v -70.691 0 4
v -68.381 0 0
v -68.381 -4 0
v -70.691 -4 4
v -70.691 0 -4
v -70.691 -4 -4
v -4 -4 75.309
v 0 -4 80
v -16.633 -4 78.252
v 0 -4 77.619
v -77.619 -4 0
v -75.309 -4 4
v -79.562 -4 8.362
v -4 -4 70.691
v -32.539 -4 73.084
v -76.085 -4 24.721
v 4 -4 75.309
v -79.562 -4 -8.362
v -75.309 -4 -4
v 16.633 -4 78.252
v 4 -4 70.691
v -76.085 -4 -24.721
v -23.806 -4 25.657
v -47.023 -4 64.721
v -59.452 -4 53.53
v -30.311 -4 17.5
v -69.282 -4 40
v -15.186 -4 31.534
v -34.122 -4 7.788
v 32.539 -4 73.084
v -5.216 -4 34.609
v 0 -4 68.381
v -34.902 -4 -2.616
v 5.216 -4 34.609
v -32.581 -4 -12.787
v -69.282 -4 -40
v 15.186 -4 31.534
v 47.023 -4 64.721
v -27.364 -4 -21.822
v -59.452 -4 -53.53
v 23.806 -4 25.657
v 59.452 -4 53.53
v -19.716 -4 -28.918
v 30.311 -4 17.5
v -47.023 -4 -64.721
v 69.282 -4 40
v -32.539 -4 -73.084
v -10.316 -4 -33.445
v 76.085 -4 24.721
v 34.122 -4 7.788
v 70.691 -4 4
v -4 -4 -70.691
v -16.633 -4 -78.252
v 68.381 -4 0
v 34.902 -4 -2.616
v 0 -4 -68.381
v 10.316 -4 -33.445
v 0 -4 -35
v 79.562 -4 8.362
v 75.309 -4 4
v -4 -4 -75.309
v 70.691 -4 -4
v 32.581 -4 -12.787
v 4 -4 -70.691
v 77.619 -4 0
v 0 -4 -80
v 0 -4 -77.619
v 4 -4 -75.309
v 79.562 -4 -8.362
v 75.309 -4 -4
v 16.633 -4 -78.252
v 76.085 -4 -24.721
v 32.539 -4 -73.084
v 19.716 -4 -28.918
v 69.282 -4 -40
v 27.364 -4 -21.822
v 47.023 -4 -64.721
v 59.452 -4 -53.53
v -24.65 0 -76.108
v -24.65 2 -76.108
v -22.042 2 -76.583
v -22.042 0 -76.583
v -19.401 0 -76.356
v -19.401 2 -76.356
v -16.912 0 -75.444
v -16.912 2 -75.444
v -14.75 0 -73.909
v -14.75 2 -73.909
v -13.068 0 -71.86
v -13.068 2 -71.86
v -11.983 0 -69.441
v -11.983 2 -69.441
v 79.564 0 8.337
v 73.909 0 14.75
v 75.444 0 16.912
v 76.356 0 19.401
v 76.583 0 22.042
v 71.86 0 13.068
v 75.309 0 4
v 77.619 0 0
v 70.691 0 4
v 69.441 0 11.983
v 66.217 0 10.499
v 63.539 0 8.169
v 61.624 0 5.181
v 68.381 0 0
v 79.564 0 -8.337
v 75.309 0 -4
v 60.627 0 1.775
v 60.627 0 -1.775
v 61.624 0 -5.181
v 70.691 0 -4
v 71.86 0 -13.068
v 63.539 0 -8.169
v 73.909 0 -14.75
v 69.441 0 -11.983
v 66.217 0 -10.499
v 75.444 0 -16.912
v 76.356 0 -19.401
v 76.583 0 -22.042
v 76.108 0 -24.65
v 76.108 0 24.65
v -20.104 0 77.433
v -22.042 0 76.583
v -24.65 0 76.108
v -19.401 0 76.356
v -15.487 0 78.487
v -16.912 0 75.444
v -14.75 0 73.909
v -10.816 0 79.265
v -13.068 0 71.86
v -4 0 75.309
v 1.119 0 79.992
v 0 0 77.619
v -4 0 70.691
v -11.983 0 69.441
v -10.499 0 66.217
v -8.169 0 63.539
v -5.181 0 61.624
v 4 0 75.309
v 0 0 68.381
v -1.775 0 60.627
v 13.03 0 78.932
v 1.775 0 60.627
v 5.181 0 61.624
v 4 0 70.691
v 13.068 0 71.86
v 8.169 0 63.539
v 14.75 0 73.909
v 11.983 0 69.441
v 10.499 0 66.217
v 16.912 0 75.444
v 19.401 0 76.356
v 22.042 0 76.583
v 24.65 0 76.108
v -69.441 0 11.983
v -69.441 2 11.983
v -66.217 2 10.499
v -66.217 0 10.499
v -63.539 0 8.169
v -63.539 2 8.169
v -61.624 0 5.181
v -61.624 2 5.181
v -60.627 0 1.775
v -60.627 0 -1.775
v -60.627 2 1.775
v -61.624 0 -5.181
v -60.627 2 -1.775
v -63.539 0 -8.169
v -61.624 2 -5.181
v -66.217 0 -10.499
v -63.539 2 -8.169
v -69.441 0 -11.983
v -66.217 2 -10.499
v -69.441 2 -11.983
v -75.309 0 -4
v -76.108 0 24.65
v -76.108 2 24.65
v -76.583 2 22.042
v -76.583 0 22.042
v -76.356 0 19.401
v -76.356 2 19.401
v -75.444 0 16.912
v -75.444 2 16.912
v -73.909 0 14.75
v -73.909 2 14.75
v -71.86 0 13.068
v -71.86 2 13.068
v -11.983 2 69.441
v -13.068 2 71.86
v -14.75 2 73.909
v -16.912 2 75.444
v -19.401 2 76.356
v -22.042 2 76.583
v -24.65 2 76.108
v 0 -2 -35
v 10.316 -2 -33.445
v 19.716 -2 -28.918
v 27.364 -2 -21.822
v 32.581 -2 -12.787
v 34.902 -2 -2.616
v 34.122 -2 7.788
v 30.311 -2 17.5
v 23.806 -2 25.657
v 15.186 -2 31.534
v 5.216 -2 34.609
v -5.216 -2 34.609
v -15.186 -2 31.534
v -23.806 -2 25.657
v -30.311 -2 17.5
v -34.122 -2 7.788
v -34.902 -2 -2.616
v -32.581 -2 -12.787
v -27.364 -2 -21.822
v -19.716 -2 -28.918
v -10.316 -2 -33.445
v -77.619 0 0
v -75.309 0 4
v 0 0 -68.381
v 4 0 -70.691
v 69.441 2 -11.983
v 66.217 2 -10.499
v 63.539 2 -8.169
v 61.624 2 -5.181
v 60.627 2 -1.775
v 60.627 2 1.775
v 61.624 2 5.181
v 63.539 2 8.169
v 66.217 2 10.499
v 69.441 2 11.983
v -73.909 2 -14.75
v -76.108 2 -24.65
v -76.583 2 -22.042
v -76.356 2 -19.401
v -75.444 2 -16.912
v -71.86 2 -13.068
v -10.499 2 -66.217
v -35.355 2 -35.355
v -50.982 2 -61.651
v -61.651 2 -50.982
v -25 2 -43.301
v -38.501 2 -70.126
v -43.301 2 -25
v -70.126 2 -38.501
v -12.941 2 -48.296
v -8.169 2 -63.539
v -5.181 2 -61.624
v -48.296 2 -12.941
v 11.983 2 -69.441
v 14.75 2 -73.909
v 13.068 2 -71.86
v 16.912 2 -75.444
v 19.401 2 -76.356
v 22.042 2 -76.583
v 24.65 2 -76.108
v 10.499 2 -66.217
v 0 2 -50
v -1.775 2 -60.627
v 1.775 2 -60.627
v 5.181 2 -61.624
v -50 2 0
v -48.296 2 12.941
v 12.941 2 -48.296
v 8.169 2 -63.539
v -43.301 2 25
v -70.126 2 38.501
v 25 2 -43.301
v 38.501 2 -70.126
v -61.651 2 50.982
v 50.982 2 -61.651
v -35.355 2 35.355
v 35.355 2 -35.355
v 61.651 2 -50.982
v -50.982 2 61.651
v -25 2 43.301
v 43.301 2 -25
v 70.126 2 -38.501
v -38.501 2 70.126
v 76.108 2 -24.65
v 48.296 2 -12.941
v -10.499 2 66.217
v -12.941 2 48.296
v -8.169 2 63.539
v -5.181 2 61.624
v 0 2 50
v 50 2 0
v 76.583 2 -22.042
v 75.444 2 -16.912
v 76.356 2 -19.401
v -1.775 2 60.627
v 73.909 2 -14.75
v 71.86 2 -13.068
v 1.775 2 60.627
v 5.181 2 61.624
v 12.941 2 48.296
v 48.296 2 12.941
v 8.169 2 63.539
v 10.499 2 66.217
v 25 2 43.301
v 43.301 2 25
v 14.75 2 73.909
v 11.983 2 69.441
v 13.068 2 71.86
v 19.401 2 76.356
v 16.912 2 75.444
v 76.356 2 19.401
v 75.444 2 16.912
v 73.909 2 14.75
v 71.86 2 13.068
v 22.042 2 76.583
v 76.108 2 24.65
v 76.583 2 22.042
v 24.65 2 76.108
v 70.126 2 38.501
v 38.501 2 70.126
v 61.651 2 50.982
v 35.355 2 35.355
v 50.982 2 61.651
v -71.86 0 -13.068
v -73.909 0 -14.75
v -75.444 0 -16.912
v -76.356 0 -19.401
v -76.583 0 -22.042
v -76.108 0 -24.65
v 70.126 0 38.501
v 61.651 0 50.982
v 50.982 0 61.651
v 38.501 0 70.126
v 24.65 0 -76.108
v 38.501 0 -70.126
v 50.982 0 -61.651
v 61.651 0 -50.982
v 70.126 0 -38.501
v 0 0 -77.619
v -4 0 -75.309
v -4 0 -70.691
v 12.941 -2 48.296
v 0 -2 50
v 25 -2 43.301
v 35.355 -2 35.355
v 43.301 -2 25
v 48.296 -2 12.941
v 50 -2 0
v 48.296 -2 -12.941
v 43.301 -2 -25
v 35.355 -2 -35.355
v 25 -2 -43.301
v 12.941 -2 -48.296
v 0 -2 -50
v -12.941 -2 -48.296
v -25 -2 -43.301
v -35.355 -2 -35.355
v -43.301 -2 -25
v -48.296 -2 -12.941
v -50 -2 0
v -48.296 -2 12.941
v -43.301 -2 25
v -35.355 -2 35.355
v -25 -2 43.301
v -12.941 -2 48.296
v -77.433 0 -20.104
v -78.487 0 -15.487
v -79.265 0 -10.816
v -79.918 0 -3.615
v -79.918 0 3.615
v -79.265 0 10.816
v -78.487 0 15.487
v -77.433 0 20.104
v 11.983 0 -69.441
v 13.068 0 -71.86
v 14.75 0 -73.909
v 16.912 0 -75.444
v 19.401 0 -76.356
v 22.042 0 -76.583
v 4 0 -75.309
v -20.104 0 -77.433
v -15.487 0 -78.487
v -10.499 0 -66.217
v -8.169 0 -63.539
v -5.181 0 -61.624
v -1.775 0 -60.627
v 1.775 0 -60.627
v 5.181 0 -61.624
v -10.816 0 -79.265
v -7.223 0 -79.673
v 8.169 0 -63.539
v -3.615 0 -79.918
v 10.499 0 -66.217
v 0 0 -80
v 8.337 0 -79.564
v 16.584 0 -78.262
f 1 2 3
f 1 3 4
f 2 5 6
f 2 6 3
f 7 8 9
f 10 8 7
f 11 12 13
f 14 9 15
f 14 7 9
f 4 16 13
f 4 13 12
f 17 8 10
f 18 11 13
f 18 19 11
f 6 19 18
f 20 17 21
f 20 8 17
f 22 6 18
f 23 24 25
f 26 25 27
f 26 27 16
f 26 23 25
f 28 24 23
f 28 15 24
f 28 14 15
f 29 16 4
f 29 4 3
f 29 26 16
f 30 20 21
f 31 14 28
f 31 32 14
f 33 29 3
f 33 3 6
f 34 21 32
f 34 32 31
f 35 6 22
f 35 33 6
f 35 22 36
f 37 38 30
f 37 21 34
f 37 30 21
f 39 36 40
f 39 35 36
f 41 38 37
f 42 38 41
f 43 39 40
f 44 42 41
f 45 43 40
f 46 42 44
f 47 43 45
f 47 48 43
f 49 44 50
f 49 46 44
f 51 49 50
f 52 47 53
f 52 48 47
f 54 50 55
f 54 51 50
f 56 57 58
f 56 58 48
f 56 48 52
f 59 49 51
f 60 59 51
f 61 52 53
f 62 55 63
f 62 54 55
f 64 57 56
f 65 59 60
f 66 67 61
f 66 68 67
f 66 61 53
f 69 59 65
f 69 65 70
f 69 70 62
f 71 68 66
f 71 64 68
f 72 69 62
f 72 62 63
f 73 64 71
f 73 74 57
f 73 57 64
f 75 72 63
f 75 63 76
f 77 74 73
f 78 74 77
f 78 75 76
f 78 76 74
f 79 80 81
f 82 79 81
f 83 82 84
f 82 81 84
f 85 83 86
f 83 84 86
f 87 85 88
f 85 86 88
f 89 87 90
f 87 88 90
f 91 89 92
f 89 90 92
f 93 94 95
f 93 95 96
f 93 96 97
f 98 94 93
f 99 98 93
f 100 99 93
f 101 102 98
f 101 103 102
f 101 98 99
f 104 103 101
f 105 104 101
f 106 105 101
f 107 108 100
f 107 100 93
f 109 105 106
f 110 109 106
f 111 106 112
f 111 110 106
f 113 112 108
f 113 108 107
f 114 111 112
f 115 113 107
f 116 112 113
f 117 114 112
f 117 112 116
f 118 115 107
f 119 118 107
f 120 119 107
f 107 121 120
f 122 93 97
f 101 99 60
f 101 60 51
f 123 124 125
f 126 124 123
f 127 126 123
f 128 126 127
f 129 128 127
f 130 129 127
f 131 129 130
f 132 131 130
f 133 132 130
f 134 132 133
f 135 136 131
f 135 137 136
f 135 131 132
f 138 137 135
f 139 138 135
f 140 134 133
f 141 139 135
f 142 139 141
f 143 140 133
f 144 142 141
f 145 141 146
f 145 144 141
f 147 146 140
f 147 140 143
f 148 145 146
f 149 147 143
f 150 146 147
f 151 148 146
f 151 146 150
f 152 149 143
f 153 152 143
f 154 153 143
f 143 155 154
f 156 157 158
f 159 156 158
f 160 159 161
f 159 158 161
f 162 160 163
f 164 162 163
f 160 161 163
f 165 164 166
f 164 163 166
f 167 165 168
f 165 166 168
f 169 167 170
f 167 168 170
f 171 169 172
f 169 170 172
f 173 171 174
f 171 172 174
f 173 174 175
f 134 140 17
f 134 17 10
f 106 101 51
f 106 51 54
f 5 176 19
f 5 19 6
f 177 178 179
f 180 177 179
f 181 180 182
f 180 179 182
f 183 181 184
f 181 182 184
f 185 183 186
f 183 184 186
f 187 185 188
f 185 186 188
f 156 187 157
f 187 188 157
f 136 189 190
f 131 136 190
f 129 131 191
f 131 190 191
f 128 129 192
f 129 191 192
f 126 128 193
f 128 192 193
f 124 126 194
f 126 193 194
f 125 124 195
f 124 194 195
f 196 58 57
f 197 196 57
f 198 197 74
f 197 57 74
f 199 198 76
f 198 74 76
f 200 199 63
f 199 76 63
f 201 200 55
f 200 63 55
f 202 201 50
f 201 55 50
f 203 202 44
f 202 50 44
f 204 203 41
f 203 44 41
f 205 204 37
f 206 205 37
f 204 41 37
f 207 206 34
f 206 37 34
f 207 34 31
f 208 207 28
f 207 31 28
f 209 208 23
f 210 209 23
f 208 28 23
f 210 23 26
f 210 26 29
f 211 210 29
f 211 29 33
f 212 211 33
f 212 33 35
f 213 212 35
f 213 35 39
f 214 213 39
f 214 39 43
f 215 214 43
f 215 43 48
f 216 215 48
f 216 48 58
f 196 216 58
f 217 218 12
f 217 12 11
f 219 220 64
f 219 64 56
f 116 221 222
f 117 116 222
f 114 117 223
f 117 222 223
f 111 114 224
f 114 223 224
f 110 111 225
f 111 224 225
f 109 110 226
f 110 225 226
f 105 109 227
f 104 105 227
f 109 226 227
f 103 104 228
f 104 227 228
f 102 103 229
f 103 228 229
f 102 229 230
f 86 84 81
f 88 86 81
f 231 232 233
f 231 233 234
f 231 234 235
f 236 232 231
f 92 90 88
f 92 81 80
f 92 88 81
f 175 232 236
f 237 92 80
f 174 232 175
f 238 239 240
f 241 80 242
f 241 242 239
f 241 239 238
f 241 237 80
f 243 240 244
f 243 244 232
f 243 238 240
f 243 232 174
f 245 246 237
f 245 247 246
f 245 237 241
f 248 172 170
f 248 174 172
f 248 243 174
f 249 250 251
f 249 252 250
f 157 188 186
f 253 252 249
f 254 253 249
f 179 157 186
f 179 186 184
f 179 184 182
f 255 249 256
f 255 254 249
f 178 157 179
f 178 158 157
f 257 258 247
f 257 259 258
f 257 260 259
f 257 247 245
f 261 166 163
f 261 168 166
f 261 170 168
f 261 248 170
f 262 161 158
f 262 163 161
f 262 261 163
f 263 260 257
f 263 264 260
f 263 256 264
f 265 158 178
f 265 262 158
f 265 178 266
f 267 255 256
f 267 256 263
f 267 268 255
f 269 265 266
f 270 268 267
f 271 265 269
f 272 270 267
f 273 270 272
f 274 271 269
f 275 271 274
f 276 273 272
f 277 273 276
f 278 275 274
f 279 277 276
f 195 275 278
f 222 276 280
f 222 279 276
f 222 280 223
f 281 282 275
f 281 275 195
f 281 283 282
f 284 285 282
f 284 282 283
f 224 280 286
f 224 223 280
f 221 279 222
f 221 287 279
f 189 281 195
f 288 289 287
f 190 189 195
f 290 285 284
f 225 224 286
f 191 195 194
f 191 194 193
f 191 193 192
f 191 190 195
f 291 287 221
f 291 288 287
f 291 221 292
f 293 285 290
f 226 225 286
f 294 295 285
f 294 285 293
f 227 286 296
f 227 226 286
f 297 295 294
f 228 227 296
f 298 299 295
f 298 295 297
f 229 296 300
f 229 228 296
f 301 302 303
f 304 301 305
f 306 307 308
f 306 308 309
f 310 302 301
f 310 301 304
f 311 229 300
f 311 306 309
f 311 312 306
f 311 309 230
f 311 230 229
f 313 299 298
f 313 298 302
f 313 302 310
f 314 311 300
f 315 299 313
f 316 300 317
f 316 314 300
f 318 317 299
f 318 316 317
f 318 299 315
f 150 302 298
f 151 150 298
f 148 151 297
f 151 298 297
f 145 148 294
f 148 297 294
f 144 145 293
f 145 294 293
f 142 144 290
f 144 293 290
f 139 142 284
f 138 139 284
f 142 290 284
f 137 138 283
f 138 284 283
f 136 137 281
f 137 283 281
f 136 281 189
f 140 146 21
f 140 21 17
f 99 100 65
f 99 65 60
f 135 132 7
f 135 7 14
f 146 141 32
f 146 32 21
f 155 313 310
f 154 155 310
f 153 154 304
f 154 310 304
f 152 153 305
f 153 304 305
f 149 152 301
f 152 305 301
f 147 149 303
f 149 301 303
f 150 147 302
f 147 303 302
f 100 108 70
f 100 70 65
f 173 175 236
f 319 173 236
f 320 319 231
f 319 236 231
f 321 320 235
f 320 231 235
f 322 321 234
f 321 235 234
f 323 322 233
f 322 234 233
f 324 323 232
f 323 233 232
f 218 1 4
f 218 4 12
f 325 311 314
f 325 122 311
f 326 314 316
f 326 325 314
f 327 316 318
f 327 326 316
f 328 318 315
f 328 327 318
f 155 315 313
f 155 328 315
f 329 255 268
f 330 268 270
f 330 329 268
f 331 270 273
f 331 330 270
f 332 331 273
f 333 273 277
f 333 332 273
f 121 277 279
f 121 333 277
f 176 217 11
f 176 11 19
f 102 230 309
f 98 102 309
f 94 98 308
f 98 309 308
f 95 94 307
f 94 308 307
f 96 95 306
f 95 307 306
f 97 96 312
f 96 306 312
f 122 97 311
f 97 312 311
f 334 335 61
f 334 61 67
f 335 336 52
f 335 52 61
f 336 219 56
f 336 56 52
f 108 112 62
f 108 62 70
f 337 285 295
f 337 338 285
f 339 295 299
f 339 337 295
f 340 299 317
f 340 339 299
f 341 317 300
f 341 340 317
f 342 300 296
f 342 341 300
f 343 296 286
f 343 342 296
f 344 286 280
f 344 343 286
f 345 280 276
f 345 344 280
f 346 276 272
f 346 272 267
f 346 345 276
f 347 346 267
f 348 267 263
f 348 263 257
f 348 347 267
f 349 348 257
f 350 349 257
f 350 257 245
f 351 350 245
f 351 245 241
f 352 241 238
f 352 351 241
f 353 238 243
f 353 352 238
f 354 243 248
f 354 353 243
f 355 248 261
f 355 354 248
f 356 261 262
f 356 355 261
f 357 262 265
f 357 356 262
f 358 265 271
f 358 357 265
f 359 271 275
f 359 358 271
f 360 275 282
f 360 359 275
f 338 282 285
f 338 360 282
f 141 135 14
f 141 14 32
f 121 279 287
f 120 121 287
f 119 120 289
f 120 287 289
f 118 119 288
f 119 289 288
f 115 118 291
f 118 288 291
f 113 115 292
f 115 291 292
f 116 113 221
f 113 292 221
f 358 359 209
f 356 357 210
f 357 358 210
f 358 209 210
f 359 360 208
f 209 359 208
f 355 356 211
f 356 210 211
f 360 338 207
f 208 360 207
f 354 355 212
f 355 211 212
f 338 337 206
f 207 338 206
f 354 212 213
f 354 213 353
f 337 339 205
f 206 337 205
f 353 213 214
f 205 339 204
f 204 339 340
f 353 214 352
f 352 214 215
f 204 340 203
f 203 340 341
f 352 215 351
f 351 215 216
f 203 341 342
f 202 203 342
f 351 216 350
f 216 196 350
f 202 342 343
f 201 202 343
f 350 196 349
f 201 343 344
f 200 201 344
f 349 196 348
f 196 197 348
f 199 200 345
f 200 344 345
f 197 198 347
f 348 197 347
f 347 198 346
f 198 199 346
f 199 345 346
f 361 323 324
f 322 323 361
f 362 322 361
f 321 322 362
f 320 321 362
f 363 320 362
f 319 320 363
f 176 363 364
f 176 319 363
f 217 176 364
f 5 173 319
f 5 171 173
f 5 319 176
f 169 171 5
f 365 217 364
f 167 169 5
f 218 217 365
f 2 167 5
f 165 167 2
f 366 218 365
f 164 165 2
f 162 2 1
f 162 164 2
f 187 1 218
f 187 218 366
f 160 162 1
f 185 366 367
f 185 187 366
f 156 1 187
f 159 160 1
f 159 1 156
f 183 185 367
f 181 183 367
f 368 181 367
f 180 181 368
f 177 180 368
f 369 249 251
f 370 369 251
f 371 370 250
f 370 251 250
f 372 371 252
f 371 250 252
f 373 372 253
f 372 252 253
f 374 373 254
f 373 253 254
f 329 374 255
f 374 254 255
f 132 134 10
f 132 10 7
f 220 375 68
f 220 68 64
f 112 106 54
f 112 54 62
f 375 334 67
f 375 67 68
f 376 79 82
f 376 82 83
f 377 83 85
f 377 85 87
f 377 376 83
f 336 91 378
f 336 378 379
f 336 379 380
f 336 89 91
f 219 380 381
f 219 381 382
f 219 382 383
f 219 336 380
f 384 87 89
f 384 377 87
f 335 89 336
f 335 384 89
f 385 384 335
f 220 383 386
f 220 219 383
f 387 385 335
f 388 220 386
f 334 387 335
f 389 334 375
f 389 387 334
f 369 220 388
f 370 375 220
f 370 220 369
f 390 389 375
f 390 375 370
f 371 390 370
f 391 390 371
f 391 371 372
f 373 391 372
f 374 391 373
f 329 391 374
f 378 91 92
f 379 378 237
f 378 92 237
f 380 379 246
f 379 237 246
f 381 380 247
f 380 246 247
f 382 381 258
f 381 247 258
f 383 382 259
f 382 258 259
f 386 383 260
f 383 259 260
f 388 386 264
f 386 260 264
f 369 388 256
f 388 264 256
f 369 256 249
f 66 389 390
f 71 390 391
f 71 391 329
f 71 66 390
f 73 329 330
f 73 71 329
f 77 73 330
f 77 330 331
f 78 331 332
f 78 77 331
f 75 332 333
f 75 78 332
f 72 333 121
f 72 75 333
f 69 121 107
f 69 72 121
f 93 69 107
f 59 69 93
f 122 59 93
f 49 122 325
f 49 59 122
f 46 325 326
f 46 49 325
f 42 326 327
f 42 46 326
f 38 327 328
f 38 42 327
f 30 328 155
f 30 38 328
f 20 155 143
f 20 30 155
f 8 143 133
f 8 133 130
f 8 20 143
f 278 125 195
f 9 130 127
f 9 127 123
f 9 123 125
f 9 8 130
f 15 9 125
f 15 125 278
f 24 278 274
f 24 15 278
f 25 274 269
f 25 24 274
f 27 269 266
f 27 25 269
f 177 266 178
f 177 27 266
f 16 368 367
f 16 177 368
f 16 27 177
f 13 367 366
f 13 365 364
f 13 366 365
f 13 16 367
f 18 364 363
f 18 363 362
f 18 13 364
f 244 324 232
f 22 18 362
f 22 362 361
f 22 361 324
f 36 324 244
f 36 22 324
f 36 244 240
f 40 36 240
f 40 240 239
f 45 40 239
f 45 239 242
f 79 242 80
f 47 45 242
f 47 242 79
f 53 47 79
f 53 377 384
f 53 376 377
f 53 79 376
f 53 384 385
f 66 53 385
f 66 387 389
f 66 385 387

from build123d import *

# Parameters (mm, degrees)
SKETCH1_R           = 80
SKETCH1_R_2         = 50
BOSS_EXTRUDE1_DEPTH = 2
BOSS_EXTRUDE2_START = 4
SKETCH2_R           = 80
SKETCH2_R_2         = 35
BOSS_EXTRUDE2_DEPTH = 4
SKETCH3_R           = 12.5
CUT_EXTRUDE1_DEPTH  = 2
FILLET1_R           = 10
CUT_EXTRUDE2_DEPTH  = 114.20777373
MOVE_FACE1_BY       = 2


with BuildPart() as part:
    # Sketch1 → Boss-Extrude1 (new body)
    with BuildSketch(Plane(origin=(0, 0, 0), x_dir=(1, 0, 0), z_dir=(0, 1, 0))):
        Circle(SKETCH1_R)
        Circle(SKETCH1_R_2, mode=Mode.SUBTRACT)
    extrude(amount=BOSS_EXTRUDE1_DEPTH)

    # Sketch2 → Boss-Extrude2 (add)
    with BuildSketch(Plane.XZ.offset(BOSS_EXTRUDE2_START)):
        Circle(SKETCH2_R)
        Circle(SKETCH2_R_2, mode=Mode.SUBTRACT)
    extrude(amount=-BOSS_EXTRUDE2_DEPTH)

    # Sketch3 → Cut-Extrude1 (cut)
    with BuildSketch(Plane(origin=(0, 2, 0), x_dir=(1, 0, 0), z_dir=(0, 1, 0))):
        with Locations((0, 73)):
            Circle(SKETCH3_R)
        with Locations((73, 0)):
            Circle(SKETCH3_R)
        with Locations((0, -73)):
            Circle(SKETCH3_R)
        with Locations((-73, 0)):
            Circle(SKETCH3_R)
    extrude(amount=-CUT_EXTRUDE1_DEPTH, mode=Mode.SUBTRACT)

    # Fillet1
    fillet1_edges = [part.edges().sort_by_distance(p)[0] for p in [
        (79.265410959, 1, 10.816405388),
        (79.265410959, 1, -10.816405388),
        (10.816405388, 1, 79.265410959),
        (-10.816405388, 1, 79.265410959),
        (-79.265410959, 1, -10.816405388),
        (-79.265410959, 1, 10.816405388),
        (10.816405388, 1, -79.265410959),
        (-10.816405388, 1, -79.265410959),
    ]]
    fillet(fillet1_edges, radius=FILLET1_R)

    # Sketch4 → Cut-Extrude2 (cut, through all)
    with BuildSketch(Plane(origin=(0, 0, 0), x_dir=(1, 0, 0), z_dir=(0, 1, 0))):
        Polygon((-4, 70.690598923), (-4, 75.309401077), (0, 77.618802154), (4, 75.309401077), (4, 70.690598923), (0, 68.381197846), align=None)
        Polygon((70.690598923, -4), (68.381197846, 0), (70.690598923, 4), (75.309401077, 4), (77.618802154, 0), (75.309401077, -4), align=None)
        Polygon((-4, -70.690598923), (0, -68.381197846), (4, -70.690598923), (4, -75.309401077), (0, -77.618802154), (-4, -75.309401077), align=None)
        Polygon((-70.690598923, 4), (-68.381197846, 0), (-70.690598923, -4), (-75.309401077, -4), (-77.618802154, 0), (-75.309401077, 4), align=None)
    extrude(amount=-CUT_EXTRUDE2_DEPTH, mode=Mode.SUBTRACT)

    # Move Face1: a face moved inward by 2.0
    extrude(part.faces().sort_by_distance((0, 0, -40))[0], amount=MOVE_FACE1_BY, dir=(0, -1, 0), mode=Mode.SUBTRACT)


solid = part.part
